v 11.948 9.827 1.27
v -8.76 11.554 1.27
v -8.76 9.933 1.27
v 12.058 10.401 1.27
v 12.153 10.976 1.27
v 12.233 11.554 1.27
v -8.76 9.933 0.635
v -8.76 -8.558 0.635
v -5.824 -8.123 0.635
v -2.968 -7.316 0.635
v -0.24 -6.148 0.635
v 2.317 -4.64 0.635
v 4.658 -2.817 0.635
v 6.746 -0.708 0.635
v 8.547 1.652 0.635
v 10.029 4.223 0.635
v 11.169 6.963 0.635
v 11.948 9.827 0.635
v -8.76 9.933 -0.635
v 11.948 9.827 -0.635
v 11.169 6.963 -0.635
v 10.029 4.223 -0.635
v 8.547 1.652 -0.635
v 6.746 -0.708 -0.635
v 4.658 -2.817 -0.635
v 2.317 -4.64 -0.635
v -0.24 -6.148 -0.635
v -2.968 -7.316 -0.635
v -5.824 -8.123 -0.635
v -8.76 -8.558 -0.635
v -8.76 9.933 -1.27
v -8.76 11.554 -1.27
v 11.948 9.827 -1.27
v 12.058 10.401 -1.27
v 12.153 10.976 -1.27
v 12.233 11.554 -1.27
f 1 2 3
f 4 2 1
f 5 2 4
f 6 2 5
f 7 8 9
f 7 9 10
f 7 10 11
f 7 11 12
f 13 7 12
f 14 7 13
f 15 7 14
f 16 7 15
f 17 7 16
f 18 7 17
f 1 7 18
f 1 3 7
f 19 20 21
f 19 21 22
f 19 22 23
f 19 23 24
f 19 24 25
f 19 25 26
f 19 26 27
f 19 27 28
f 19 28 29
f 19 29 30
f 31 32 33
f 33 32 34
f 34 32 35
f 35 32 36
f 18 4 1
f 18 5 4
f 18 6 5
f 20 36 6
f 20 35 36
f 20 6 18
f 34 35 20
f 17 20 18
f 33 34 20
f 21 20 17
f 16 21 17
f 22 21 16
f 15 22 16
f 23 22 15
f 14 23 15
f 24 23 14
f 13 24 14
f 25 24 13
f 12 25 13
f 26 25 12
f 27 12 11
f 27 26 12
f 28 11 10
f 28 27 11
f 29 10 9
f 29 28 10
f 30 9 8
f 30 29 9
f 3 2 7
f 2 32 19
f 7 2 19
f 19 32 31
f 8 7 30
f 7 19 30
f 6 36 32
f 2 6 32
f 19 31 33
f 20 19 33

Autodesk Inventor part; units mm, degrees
ref_plane "YZ Plane" through (0, 0, 0) normal (1, 0, 0) x (0, 1, 0)
ref_plane "XZ Plane" through (0, 0, 0) normal (0, 1, 0) x (-1, 0, 0)
ref_plane "XY Plane" through (0, 0, 0) normal (0, 0, 1) x (1, 0, 0)
sketch "Sketch1" plane through (0, 0, 0) normal (0, 0, 1) x (1, 0, 0)
  line L0 (12.2331, 11.5545) -> (-8.7602, 11.5545)
  line L1 (-8.7602, 11.5545) -> (-8.7602, -8.5579)
  arc A0 (-8.7602, -8.5579) -> (12.2331, 11.5545) centre (-10.663, 14.4408) ccw
  point P0 (0, 0)
extrude "Extrusion1" add sketch "Sketch1" along normal mid plane 2.54
sketch "Sketch2" plane through (0, 0, 1.27) normal (0, 0, 1) x (1, 0, 0)
  line L0 (-8.7602, 11.5545) -> (-8.7602, -8.5579) projected
  line L1 (-8.7602, 9.9328) -> (11.9484, 9.8273)
  arc A0 (-8.7602, -8.5579) -> (12.2331, 11.5545) centre (-10.663, 14.4408) ccw projected
  point P0 (0, 0)
extrude "Extrusion2" cut sketch "Sketch2" against normal blind 0.635
sketch "Sketch3" plane through (0, 0, -1.27) normal (0, 0, -1) x (-1, 0, 0)
  line L0 (8.7602, 9.9328) -> (-11.9484, 9.8273) projected
  line L1 (8.7602, -8.5579) -> (8.7602, 11.5545) projected
  line L2 (8.7602, 9.9328) -> (8.7602, -8.5579)
  arc A0 (-11.9484, 9.8273) -> (8.7602, -8.5579) centre (10.663, 14.4408) ccw
  point P0 (0, 0)
extrude "Extrusion3" cut sketch "Sketch3" against normal blind 0.635
properties part number "Control surface"
